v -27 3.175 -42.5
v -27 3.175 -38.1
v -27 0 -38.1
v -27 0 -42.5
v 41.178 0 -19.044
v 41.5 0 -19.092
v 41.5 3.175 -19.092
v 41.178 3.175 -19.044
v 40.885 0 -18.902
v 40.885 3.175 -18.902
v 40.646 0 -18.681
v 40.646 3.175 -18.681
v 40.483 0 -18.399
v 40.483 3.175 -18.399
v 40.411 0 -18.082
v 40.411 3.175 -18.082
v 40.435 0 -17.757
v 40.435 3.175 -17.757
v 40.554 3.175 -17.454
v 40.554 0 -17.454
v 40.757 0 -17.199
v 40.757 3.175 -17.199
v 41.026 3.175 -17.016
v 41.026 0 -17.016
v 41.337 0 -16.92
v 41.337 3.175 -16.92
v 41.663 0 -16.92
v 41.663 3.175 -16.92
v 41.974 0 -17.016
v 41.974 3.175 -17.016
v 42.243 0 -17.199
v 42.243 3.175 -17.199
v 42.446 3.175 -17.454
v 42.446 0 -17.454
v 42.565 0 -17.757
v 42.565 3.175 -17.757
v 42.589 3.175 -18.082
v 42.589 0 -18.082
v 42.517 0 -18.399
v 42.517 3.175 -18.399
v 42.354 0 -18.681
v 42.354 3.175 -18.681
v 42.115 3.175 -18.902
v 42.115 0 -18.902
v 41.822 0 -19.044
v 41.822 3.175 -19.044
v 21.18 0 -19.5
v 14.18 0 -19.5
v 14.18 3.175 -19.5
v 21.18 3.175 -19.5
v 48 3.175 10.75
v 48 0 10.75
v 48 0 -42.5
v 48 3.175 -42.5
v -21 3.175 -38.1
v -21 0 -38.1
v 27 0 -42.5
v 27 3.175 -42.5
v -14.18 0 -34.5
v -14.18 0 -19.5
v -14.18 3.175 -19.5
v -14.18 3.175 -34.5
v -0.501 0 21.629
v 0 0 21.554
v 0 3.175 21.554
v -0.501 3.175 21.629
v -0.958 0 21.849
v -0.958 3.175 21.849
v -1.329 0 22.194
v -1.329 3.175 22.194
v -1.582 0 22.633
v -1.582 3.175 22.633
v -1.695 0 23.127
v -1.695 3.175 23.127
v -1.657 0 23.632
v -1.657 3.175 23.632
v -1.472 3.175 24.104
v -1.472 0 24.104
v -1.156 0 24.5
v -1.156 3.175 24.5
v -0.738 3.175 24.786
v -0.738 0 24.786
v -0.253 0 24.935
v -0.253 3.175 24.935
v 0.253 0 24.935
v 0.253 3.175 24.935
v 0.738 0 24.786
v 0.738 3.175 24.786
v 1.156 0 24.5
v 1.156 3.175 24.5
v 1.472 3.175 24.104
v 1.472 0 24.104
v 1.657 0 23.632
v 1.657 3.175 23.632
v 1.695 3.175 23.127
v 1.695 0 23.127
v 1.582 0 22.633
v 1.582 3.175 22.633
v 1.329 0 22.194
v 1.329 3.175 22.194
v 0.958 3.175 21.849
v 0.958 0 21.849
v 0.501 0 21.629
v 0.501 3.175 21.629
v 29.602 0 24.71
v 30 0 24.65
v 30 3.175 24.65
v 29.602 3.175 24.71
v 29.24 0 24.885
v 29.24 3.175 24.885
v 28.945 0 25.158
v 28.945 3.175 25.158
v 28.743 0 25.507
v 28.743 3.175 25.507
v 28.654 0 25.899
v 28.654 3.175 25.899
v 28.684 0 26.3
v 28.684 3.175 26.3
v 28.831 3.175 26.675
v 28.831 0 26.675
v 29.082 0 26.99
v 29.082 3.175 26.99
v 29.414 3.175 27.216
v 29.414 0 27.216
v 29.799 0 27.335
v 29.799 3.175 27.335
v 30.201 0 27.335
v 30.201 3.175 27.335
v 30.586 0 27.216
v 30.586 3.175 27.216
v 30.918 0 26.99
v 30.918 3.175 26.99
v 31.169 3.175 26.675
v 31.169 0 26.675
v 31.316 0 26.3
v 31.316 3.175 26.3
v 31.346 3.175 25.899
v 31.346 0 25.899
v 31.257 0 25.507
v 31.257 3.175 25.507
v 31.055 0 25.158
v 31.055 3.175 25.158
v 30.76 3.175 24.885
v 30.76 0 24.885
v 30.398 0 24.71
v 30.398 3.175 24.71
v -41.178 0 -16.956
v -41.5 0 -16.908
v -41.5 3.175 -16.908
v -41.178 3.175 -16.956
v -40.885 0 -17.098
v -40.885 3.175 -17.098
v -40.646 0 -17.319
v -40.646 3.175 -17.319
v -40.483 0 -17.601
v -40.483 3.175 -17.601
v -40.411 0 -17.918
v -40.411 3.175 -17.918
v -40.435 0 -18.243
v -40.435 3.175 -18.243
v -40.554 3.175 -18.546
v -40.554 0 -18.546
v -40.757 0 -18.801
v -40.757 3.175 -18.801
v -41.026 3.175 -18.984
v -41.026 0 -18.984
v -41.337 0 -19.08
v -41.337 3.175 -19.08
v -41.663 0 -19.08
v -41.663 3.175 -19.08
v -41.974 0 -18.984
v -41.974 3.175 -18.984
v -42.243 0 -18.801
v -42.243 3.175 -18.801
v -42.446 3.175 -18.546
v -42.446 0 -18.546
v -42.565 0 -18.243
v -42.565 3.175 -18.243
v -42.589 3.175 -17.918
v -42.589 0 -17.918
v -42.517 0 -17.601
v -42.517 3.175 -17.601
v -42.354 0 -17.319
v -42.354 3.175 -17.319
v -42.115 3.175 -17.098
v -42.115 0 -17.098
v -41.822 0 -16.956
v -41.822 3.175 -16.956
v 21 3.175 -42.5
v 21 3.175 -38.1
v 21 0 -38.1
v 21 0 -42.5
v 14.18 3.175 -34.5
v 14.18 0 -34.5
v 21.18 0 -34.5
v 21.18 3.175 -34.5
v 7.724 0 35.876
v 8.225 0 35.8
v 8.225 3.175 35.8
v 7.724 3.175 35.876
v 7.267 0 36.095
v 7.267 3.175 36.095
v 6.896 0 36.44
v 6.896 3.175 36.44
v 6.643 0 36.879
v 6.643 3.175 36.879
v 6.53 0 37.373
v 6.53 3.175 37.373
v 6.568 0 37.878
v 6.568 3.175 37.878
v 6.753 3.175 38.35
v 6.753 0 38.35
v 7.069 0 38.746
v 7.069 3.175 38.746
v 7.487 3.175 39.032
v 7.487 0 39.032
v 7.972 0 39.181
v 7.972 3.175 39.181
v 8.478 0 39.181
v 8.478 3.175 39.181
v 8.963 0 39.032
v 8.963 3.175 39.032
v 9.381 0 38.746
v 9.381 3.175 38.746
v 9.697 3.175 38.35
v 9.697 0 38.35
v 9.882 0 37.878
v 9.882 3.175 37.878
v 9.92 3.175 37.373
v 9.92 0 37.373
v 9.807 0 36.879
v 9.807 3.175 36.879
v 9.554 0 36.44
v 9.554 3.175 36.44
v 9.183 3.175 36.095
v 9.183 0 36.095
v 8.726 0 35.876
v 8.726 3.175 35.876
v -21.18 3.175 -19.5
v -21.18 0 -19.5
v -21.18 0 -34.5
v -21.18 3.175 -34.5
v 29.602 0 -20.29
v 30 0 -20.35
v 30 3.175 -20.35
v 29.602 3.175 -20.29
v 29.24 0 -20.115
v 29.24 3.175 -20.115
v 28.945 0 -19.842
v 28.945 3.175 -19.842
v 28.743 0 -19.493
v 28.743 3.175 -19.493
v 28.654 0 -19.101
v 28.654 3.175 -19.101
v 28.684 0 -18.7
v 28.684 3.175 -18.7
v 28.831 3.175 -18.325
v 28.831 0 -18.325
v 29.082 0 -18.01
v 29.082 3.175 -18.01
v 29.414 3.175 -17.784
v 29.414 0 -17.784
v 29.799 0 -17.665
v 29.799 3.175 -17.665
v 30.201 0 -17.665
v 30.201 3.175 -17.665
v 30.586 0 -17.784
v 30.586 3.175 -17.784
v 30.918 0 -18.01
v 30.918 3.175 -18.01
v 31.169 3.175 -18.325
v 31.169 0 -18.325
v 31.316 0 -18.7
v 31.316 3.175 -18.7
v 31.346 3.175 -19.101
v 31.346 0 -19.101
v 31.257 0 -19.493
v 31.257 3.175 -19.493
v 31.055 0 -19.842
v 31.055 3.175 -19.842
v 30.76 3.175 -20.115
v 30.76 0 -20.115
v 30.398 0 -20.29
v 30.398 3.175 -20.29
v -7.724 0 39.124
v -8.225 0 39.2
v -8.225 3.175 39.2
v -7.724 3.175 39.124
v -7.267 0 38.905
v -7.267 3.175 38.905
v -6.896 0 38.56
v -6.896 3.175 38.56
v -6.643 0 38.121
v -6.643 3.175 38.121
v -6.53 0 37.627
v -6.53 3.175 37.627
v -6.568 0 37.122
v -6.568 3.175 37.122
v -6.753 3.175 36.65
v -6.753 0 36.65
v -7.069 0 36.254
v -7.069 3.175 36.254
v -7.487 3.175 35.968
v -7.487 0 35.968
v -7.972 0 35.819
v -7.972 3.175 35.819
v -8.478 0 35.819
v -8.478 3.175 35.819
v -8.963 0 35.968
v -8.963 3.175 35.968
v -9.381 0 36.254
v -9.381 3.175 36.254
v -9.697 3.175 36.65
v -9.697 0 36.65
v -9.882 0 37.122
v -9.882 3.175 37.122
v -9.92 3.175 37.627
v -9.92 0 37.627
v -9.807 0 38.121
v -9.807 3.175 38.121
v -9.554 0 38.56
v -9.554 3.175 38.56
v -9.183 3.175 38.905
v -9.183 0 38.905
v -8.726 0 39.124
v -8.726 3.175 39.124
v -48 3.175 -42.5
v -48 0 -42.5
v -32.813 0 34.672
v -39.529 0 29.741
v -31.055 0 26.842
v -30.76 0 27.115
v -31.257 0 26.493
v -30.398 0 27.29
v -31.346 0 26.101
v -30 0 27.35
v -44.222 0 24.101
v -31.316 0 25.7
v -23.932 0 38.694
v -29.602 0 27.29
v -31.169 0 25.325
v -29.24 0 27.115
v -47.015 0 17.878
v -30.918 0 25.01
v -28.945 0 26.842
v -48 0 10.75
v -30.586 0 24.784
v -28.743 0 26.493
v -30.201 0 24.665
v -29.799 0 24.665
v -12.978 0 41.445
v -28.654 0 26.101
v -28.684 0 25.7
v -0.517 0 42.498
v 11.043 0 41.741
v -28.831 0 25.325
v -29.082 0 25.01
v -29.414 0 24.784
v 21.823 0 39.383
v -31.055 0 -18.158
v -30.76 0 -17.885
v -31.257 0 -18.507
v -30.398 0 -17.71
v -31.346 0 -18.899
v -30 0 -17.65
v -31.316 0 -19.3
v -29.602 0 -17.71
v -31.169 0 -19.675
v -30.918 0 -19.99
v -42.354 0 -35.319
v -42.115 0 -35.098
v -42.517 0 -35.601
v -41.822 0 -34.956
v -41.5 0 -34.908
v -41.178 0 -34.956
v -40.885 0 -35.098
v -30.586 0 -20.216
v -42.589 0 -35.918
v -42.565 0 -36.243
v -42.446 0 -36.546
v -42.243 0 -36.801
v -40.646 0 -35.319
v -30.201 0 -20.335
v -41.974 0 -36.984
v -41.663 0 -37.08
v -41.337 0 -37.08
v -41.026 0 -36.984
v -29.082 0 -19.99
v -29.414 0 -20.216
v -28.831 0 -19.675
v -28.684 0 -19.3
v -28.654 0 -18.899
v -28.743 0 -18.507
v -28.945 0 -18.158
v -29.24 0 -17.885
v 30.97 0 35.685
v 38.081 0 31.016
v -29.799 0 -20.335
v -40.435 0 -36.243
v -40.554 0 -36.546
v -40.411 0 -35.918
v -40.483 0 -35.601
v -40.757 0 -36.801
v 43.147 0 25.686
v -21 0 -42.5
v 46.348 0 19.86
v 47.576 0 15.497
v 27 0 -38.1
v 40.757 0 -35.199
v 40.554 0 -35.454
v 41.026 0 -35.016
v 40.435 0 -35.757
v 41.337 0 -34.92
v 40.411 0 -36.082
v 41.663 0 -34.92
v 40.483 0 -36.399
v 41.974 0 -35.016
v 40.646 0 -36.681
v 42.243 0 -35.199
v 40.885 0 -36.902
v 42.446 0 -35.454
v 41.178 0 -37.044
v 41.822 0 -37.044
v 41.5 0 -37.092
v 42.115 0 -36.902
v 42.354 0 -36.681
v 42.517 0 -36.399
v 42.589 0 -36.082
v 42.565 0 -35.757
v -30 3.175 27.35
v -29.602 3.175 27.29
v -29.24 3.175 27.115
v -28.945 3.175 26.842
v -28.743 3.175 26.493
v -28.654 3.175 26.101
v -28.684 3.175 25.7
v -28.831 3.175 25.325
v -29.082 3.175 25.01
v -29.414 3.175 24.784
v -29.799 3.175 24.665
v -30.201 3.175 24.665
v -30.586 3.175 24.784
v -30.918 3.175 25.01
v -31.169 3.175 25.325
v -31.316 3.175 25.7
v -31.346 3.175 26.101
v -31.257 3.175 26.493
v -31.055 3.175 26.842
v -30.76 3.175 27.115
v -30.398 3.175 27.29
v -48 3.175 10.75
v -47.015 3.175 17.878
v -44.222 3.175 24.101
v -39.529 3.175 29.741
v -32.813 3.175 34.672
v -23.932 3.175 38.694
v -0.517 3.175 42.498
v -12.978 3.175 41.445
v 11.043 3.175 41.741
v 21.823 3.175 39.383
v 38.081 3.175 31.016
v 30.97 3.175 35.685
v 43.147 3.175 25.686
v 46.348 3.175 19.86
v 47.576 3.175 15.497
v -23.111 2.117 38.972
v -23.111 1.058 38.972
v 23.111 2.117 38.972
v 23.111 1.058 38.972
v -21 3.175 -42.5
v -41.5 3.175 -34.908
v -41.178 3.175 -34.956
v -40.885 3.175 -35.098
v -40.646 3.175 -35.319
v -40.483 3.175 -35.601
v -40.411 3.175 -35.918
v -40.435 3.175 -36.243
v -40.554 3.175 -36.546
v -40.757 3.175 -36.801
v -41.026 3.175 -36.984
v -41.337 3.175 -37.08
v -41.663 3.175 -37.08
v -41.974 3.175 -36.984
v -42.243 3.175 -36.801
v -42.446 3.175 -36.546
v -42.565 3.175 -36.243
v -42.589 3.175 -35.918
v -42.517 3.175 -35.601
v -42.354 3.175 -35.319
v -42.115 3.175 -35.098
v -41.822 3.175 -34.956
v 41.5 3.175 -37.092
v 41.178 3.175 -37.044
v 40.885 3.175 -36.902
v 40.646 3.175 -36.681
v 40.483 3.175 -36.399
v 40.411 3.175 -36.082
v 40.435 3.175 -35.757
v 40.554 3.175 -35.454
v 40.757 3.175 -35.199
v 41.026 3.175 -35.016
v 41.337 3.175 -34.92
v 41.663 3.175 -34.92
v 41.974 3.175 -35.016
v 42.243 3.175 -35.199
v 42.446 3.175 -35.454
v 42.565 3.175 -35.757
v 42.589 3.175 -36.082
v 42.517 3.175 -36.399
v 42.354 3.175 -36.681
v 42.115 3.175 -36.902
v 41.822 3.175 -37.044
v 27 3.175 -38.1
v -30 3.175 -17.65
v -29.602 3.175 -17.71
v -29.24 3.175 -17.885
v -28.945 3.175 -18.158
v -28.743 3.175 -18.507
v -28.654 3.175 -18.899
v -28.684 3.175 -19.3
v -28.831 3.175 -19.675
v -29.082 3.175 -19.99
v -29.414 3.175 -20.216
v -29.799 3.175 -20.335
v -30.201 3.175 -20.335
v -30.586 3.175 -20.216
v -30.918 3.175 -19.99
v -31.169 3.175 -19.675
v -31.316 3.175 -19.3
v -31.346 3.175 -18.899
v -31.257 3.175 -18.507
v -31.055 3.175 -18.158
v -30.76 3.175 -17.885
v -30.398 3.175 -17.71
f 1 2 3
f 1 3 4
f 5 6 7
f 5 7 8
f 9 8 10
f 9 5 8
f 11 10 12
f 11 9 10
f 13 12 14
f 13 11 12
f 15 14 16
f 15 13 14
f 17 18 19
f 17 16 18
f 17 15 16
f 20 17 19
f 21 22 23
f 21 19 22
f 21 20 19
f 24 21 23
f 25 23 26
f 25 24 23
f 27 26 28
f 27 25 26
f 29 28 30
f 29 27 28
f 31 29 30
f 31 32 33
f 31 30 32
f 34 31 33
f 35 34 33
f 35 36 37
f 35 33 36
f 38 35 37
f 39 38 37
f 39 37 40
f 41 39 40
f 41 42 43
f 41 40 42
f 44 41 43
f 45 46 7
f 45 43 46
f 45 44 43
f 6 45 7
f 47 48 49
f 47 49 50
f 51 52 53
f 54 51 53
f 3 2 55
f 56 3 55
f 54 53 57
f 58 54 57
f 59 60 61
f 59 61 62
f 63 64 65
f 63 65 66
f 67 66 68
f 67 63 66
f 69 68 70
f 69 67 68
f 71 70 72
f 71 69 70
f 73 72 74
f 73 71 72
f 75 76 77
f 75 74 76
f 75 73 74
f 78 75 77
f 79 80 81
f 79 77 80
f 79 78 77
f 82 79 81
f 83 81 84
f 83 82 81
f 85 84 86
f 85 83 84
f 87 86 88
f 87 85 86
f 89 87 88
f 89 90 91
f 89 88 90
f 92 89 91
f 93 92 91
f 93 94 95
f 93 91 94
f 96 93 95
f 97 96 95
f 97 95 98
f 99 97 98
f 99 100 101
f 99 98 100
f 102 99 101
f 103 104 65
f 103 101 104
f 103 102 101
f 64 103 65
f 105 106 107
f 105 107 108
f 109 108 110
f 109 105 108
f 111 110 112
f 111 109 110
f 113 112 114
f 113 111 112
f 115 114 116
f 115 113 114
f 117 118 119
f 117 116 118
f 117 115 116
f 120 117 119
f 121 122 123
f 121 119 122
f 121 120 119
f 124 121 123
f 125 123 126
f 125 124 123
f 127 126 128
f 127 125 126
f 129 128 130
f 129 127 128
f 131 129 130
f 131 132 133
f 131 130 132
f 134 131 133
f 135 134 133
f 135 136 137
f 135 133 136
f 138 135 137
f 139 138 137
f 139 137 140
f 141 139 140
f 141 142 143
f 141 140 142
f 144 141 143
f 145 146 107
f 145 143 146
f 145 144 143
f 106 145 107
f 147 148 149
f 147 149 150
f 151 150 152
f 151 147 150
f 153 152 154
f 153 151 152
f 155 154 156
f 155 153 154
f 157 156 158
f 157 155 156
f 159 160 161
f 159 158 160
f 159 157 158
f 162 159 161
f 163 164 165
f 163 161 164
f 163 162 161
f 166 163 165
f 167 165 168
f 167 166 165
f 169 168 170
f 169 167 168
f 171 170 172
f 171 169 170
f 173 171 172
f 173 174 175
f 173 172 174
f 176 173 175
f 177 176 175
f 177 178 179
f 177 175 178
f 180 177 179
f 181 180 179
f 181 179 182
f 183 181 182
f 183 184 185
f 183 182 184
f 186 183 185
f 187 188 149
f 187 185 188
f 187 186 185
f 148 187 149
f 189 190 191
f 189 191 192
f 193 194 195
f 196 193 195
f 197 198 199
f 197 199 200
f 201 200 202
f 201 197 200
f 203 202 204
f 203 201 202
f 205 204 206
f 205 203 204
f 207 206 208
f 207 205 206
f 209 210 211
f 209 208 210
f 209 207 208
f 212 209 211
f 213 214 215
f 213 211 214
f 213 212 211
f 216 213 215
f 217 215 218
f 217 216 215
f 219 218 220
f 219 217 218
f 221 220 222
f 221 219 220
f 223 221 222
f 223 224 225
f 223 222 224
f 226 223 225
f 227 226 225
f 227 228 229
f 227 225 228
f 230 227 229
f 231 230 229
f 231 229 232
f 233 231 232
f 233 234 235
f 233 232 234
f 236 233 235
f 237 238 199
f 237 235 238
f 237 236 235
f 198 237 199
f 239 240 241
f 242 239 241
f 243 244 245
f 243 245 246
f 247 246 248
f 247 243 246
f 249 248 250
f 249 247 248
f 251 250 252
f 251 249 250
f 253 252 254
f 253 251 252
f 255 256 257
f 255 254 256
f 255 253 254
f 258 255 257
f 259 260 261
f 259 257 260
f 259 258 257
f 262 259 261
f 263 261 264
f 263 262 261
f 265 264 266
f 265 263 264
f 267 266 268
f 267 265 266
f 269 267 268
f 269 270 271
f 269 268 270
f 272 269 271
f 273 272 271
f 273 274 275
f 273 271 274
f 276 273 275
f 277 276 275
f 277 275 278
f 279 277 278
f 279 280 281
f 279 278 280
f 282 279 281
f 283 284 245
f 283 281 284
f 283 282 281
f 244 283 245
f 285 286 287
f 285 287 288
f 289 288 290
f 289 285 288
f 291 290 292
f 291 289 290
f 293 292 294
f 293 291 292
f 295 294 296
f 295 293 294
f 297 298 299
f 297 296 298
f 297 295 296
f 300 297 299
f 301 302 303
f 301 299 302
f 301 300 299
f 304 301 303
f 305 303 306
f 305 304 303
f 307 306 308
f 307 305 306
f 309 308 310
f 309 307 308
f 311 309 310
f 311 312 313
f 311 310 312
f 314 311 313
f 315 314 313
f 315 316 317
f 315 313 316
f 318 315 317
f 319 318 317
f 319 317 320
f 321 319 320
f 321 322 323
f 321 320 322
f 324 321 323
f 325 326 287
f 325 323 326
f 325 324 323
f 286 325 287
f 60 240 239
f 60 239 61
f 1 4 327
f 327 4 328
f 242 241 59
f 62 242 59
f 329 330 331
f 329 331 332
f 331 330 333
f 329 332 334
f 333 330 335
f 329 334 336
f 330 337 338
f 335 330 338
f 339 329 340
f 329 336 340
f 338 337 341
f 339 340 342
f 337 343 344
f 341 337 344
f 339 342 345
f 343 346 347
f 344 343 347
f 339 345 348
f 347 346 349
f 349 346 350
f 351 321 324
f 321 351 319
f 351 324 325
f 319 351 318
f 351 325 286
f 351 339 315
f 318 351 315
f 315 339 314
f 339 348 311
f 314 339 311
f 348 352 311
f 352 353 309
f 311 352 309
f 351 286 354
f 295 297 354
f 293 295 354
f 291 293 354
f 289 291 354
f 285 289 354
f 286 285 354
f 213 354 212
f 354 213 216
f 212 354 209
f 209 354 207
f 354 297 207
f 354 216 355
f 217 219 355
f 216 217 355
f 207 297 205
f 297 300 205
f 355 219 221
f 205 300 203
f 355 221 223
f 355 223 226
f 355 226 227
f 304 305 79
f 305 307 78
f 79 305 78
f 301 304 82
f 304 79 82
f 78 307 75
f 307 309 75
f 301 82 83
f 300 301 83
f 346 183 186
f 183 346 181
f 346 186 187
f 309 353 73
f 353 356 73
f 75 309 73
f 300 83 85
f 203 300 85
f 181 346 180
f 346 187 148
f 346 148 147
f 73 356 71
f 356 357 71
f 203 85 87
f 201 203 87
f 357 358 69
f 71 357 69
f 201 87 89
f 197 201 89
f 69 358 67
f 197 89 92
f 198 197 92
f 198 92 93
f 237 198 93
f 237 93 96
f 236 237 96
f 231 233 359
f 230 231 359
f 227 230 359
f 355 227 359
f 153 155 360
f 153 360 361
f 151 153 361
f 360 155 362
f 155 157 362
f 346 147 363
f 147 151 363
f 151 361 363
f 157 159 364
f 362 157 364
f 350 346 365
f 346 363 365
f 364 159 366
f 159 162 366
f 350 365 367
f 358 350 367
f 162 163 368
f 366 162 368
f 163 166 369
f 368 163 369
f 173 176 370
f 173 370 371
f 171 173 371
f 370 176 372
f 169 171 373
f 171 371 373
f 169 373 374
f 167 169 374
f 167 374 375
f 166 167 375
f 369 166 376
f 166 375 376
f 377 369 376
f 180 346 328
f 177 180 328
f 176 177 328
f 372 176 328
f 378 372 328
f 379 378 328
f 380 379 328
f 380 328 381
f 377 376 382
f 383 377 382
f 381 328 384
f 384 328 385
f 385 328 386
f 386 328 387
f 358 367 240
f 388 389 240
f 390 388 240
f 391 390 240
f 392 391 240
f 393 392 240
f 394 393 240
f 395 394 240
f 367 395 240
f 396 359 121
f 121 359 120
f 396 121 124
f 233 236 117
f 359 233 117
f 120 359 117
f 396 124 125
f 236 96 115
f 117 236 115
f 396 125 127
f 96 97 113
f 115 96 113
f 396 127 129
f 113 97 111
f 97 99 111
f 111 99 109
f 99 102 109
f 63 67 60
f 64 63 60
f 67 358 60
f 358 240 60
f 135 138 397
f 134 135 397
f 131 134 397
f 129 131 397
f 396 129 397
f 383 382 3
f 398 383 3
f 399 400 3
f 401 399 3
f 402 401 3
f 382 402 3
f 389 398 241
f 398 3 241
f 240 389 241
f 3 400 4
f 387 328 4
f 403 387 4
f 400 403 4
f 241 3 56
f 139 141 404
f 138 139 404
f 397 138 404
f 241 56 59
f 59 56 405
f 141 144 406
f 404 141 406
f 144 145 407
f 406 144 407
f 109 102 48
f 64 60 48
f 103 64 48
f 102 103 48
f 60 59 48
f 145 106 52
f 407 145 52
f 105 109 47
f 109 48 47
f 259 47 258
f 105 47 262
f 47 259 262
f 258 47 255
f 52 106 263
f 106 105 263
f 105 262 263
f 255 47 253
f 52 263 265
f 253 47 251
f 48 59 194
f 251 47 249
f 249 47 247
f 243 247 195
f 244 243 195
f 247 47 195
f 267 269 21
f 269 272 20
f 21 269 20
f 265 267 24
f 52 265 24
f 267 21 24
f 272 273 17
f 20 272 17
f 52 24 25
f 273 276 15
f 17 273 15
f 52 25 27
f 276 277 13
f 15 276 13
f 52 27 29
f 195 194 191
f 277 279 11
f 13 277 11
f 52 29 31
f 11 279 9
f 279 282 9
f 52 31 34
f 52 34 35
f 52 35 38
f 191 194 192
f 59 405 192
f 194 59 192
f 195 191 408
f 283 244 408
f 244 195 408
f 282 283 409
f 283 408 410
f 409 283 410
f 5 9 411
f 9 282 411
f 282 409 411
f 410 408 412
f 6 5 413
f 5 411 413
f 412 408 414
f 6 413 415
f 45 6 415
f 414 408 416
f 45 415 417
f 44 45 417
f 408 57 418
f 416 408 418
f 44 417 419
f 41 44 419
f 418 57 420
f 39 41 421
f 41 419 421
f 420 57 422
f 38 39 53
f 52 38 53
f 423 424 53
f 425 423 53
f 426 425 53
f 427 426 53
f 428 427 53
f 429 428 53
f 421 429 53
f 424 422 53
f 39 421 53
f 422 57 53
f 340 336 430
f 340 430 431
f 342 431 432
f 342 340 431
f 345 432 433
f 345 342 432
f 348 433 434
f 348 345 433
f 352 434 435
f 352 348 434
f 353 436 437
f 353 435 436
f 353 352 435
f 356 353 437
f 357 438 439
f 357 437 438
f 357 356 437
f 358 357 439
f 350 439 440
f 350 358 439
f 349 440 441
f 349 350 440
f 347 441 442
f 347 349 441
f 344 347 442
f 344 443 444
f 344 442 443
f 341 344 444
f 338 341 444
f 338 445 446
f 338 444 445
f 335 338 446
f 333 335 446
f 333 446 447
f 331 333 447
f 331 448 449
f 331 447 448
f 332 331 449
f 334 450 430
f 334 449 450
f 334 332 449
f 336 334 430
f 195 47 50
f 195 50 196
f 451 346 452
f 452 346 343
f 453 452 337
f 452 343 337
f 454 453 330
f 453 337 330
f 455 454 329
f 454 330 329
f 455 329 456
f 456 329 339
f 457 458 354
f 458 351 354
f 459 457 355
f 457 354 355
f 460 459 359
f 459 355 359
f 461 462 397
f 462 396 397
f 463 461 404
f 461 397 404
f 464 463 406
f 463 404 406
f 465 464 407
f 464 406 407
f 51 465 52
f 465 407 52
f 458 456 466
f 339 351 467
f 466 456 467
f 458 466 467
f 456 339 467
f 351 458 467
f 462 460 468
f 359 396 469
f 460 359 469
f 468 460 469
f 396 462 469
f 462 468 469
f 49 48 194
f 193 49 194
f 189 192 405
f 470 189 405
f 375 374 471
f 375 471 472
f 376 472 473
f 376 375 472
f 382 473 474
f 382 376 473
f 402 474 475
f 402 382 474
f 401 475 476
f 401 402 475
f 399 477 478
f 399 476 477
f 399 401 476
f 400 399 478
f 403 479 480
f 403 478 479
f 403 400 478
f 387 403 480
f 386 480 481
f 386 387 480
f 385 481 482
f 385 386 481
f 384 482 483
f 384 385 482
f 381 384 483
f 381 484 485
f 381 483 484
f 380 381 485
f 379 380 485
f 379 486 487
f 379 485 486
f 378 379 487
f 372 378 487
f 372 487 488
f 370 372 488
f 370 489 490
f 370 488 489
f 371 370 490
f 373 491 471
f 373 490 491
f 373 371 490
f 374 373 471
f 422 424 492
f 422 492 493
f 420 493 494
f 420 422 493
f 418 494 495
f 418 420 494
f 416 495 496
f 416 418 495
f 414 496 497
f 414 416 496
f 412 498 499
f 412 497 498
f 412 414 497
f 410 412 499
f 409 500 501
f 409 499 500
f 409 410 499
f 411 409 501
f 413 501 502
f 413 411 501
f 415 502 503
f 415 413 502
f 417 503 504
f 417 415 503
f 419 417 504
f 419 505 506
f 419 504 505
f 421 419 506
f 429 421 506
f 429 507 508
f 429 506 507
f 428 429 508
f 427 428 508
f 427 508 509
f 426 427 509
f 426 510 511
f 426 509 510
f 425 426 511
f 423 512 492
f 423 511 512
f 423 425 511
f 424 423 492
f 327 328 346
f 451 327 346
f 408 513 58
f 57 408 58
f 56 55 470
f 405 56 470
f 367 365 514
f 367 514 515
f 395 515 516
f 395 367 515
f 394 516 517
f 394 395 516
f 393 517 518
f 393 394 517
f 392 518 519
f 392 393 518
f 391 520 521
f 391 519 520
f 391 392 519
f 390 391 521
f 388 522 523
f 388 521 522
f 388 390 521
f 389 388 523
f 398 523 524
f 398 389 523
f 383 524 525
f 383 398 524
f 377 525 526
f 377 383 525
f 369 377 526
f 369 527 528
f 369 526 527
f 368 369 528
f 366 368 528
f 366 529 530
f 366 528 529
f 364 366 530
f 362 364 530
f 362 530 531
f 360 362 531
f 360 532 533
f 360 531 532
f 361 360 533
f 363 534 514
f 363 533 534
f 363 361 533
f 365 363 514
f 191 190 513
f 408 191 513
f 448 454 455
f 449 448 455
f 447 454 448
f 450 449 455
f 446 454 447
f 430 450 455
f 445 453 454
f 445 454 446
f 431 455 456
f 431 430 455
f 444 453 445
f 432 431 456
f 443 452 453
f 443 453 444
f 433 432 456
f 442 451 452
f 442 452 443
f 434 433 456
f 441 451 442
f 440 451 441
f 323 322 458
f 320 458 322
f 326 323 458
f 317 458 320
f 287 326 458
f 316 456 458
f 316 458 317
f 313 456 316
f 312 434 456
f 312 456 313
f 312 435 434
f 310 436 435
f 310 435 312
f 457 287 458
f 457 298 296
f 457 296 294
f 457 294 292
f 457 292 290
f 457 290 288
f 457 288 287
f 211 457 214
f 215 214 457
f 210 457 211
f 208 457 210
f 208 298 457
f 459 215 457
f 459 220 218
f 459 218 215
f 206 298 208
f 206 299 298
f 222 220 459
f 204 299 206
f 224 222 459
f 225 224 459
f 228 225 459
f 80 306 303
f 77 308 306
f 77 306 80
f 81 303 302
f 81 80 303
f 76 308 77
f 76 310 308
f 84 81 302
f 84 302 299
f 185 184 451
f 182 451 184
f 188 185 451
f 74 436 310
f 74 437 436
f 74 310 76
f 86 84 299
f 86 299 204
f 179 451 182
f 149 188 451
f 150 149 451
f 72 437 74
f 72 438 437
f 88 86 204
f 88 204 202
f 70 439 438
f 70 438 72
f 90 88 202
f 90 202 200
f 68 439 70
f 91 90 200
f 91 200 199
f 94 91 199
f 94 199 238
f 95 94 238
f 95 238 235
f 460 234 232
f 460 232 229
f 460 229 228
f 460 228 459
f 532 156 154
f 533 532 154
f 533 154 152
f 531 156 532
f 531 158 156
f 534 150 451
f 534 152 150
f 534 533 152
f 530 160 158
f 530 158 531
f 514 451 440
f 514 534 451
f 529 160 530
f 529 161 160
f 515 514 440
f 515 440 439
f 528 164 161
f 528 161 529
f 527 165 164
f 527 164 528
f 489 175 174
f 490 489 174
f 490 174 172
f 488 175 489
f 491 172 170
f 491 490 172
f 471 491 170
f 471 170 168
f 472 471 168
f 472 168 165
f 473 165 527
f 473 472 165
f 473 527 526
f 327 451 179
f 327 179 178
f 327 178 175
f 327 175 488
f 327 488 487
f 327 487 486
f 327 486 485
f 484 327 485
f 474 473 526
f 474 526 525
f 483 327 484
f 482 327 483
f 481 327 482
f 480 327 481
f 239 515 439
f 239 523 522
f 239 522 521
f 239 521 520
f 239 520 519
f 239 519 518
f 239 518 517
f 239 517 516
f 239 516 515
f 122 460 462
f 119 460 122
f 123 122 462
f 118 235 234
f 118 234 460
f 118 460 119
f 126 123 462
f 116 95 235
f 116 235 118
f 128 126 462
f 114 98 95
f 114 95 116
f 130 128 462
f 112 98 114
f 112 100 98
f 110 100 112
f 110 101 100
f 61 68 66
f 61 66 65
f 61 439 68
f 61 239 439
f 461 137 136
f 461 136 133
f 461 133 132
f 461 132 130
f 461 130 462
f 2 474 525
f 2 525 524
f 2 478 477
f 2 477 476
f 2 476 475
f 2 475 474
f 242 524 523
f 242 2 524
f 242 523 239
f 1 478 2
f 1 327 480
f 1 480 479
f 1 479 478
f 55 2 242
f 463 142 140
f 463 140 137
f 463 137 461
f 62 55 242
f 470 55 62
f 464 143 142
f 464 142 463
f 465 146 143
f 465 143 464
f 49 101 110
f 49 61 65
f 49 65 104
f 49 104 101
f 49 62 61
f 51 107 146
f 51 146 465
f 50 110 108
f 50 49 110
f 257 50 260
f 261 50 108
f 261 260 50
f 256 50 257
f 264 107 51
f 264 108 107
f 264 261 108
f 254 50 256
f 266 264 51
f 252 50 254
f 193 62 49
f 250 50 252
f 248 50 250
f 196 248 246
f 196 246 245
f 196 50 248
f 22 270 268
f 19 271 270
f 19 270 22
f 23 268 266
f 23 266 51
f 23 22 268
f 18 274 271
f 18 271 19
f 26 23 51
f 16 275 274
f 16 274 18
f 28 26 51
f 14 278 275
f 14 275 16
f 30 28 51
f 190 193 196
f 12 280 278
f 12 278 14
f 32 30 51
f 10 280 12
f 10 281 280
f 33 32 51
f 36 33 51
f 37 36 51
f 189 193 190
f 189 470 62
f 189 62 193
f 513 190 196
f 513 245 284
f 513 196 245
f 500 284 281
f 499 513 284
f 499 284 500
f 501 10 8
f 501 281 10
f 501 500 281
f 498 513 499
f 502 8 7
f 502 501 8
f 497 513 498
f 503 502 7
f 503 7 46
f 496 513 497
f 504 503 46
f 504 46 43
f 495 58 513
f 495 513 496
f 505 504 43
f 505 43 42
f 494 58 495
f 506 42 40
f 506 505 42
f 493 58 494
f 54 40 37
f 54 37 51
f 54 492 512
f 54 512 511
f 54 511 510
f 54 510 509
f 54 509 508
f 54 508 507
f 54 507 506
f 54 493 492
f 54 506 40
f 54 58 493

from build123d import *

# Parameters (mm, degrees)
BOSS_EXTRUDE1_DEPTH     = 3.175
CUT_EXTRUDE1_DEPTH      = 65.189801711
CUT_EXTRUDE1_DEPTH_BACK = 65.189801711
SKETCH3_R               = 1.0922
SKETCH3_R_2             = 1.35
SKETCH3_R_3             = 1.7
SKETCH3_W               = 7
SKETCH3_H               = 15
SKETCH5_W               = 6
SKETCH5_H               = 4.4
CUT_EXTRUDE2_DEPTH      = 65.189801711


with BuildPart() as part:
    # Sketch2 → Boss-Extrude1 (new body)
    with BuildSketch(Plane(origin=(0, 0, 0), x_dir=(1, 0, 0), z_dir=(0, 1, 0))):
        with BuildLine():
            Line((48, 42.5), (-48, 42.5))
            Line((-48, 42.5), (-48, -10.75))
            add(Edge.make_bspline(
                [(-48, -10.75), (-48, -53.083333333), (48, -53.083333333), (48, -10.75)],
                knots=[0, 0, 0, 0, 1, 1, 1, 1], degree=3))
            Line((48, -10.75), (48, 42.5))
        make_face()
    extrude(amount=BOSS_EXTRUDE1_DEPTH)

    # Sketch3 → Cut-Extrude1 (cut, two sides: drawn at the far end of the back side and taken through both)
    with BuildSketch(Plane(origin=(0, 3.175, 0), x_dir=(1, 0, 0), z_dir=(0, 1, 0)).offset(-CUT_EXTRUDE1_DEPTH_BACK)):
        with Locations(Location((-41.5, 36, 0), (0, 0, 270))):
            Circle(SKETCH3_R)
        with Locations(Location((-41.5, 18, 0), (0, 0, 270))):
            Circle(SKETCH3_R)
        with Locations(Location((-30, 19, 0), (0, 0, 270))):
            Circle(SKETCH3_R_2)
        with Locations(Location((41.5, 18, 0), (0, 0, 90))):
            Circle(SKETCH3_R)
        with Locations(Location((41.5, 36, 0), (0, 0, 90))):
            Circle(SKETCH3_R)
        with Locations(Location((-30, -26, 0), (0, 0, 270))):
            Circle(SKETCH3_R_2)
        with Locations(Location((30, -26, 0), (0, 0, 90))):
            Circle(SKETCH3_R_2)
        with Locations(Location((30, 19, 0), (0, 0, 90))):
            Circle(SKETCH3_R_2)
        with Locations(Location((-8.225, -37.5, 0), (0, 0, 270))):
            Circle(SKETCH3_R_3)
        with Locations(Location((8.225, -37.5, 0), (0, 0, 90))):
            Circle(SKETCH3_R_3)
        with Locations(Location((0, -23.253882108, 0), (0, 0, 90))):
            Circle(SKETCH3_R_3)
        with Locations((-17.68, 27)):
            Rectangle(SKETCH3_W, SKETCH3_H)
        with Locations((17.68, 27)):
            Rectangle(SKETCH3_W, SKETCH3_H)
    extrude(amount=CUT_EXTRUDE1_DEPTH + CUT_EXTRUDE1_DEPTH_BACK, mode=Mode.SUBTRACT)

    # Sketch5 → Cut-Extrude2 (cut, through all)
    with BuildSketch(Plane(origin=(0, 3.175, 0), x_dir=(1, 0, 0), z_dir=(0, 1, 0))):
        with Locations((24, 40.3)):
            Rectangle(SKETCH5_W, SKETCH5_H)
        with Locations((-24, 40.3)):
            Rectangle(SKETCH5_W, SKETCH5_H)
    extrude(amount=-CUT_EXTRUDE2_DEPTH, mode=Mode.SUBTRACT)


solid = part.part
